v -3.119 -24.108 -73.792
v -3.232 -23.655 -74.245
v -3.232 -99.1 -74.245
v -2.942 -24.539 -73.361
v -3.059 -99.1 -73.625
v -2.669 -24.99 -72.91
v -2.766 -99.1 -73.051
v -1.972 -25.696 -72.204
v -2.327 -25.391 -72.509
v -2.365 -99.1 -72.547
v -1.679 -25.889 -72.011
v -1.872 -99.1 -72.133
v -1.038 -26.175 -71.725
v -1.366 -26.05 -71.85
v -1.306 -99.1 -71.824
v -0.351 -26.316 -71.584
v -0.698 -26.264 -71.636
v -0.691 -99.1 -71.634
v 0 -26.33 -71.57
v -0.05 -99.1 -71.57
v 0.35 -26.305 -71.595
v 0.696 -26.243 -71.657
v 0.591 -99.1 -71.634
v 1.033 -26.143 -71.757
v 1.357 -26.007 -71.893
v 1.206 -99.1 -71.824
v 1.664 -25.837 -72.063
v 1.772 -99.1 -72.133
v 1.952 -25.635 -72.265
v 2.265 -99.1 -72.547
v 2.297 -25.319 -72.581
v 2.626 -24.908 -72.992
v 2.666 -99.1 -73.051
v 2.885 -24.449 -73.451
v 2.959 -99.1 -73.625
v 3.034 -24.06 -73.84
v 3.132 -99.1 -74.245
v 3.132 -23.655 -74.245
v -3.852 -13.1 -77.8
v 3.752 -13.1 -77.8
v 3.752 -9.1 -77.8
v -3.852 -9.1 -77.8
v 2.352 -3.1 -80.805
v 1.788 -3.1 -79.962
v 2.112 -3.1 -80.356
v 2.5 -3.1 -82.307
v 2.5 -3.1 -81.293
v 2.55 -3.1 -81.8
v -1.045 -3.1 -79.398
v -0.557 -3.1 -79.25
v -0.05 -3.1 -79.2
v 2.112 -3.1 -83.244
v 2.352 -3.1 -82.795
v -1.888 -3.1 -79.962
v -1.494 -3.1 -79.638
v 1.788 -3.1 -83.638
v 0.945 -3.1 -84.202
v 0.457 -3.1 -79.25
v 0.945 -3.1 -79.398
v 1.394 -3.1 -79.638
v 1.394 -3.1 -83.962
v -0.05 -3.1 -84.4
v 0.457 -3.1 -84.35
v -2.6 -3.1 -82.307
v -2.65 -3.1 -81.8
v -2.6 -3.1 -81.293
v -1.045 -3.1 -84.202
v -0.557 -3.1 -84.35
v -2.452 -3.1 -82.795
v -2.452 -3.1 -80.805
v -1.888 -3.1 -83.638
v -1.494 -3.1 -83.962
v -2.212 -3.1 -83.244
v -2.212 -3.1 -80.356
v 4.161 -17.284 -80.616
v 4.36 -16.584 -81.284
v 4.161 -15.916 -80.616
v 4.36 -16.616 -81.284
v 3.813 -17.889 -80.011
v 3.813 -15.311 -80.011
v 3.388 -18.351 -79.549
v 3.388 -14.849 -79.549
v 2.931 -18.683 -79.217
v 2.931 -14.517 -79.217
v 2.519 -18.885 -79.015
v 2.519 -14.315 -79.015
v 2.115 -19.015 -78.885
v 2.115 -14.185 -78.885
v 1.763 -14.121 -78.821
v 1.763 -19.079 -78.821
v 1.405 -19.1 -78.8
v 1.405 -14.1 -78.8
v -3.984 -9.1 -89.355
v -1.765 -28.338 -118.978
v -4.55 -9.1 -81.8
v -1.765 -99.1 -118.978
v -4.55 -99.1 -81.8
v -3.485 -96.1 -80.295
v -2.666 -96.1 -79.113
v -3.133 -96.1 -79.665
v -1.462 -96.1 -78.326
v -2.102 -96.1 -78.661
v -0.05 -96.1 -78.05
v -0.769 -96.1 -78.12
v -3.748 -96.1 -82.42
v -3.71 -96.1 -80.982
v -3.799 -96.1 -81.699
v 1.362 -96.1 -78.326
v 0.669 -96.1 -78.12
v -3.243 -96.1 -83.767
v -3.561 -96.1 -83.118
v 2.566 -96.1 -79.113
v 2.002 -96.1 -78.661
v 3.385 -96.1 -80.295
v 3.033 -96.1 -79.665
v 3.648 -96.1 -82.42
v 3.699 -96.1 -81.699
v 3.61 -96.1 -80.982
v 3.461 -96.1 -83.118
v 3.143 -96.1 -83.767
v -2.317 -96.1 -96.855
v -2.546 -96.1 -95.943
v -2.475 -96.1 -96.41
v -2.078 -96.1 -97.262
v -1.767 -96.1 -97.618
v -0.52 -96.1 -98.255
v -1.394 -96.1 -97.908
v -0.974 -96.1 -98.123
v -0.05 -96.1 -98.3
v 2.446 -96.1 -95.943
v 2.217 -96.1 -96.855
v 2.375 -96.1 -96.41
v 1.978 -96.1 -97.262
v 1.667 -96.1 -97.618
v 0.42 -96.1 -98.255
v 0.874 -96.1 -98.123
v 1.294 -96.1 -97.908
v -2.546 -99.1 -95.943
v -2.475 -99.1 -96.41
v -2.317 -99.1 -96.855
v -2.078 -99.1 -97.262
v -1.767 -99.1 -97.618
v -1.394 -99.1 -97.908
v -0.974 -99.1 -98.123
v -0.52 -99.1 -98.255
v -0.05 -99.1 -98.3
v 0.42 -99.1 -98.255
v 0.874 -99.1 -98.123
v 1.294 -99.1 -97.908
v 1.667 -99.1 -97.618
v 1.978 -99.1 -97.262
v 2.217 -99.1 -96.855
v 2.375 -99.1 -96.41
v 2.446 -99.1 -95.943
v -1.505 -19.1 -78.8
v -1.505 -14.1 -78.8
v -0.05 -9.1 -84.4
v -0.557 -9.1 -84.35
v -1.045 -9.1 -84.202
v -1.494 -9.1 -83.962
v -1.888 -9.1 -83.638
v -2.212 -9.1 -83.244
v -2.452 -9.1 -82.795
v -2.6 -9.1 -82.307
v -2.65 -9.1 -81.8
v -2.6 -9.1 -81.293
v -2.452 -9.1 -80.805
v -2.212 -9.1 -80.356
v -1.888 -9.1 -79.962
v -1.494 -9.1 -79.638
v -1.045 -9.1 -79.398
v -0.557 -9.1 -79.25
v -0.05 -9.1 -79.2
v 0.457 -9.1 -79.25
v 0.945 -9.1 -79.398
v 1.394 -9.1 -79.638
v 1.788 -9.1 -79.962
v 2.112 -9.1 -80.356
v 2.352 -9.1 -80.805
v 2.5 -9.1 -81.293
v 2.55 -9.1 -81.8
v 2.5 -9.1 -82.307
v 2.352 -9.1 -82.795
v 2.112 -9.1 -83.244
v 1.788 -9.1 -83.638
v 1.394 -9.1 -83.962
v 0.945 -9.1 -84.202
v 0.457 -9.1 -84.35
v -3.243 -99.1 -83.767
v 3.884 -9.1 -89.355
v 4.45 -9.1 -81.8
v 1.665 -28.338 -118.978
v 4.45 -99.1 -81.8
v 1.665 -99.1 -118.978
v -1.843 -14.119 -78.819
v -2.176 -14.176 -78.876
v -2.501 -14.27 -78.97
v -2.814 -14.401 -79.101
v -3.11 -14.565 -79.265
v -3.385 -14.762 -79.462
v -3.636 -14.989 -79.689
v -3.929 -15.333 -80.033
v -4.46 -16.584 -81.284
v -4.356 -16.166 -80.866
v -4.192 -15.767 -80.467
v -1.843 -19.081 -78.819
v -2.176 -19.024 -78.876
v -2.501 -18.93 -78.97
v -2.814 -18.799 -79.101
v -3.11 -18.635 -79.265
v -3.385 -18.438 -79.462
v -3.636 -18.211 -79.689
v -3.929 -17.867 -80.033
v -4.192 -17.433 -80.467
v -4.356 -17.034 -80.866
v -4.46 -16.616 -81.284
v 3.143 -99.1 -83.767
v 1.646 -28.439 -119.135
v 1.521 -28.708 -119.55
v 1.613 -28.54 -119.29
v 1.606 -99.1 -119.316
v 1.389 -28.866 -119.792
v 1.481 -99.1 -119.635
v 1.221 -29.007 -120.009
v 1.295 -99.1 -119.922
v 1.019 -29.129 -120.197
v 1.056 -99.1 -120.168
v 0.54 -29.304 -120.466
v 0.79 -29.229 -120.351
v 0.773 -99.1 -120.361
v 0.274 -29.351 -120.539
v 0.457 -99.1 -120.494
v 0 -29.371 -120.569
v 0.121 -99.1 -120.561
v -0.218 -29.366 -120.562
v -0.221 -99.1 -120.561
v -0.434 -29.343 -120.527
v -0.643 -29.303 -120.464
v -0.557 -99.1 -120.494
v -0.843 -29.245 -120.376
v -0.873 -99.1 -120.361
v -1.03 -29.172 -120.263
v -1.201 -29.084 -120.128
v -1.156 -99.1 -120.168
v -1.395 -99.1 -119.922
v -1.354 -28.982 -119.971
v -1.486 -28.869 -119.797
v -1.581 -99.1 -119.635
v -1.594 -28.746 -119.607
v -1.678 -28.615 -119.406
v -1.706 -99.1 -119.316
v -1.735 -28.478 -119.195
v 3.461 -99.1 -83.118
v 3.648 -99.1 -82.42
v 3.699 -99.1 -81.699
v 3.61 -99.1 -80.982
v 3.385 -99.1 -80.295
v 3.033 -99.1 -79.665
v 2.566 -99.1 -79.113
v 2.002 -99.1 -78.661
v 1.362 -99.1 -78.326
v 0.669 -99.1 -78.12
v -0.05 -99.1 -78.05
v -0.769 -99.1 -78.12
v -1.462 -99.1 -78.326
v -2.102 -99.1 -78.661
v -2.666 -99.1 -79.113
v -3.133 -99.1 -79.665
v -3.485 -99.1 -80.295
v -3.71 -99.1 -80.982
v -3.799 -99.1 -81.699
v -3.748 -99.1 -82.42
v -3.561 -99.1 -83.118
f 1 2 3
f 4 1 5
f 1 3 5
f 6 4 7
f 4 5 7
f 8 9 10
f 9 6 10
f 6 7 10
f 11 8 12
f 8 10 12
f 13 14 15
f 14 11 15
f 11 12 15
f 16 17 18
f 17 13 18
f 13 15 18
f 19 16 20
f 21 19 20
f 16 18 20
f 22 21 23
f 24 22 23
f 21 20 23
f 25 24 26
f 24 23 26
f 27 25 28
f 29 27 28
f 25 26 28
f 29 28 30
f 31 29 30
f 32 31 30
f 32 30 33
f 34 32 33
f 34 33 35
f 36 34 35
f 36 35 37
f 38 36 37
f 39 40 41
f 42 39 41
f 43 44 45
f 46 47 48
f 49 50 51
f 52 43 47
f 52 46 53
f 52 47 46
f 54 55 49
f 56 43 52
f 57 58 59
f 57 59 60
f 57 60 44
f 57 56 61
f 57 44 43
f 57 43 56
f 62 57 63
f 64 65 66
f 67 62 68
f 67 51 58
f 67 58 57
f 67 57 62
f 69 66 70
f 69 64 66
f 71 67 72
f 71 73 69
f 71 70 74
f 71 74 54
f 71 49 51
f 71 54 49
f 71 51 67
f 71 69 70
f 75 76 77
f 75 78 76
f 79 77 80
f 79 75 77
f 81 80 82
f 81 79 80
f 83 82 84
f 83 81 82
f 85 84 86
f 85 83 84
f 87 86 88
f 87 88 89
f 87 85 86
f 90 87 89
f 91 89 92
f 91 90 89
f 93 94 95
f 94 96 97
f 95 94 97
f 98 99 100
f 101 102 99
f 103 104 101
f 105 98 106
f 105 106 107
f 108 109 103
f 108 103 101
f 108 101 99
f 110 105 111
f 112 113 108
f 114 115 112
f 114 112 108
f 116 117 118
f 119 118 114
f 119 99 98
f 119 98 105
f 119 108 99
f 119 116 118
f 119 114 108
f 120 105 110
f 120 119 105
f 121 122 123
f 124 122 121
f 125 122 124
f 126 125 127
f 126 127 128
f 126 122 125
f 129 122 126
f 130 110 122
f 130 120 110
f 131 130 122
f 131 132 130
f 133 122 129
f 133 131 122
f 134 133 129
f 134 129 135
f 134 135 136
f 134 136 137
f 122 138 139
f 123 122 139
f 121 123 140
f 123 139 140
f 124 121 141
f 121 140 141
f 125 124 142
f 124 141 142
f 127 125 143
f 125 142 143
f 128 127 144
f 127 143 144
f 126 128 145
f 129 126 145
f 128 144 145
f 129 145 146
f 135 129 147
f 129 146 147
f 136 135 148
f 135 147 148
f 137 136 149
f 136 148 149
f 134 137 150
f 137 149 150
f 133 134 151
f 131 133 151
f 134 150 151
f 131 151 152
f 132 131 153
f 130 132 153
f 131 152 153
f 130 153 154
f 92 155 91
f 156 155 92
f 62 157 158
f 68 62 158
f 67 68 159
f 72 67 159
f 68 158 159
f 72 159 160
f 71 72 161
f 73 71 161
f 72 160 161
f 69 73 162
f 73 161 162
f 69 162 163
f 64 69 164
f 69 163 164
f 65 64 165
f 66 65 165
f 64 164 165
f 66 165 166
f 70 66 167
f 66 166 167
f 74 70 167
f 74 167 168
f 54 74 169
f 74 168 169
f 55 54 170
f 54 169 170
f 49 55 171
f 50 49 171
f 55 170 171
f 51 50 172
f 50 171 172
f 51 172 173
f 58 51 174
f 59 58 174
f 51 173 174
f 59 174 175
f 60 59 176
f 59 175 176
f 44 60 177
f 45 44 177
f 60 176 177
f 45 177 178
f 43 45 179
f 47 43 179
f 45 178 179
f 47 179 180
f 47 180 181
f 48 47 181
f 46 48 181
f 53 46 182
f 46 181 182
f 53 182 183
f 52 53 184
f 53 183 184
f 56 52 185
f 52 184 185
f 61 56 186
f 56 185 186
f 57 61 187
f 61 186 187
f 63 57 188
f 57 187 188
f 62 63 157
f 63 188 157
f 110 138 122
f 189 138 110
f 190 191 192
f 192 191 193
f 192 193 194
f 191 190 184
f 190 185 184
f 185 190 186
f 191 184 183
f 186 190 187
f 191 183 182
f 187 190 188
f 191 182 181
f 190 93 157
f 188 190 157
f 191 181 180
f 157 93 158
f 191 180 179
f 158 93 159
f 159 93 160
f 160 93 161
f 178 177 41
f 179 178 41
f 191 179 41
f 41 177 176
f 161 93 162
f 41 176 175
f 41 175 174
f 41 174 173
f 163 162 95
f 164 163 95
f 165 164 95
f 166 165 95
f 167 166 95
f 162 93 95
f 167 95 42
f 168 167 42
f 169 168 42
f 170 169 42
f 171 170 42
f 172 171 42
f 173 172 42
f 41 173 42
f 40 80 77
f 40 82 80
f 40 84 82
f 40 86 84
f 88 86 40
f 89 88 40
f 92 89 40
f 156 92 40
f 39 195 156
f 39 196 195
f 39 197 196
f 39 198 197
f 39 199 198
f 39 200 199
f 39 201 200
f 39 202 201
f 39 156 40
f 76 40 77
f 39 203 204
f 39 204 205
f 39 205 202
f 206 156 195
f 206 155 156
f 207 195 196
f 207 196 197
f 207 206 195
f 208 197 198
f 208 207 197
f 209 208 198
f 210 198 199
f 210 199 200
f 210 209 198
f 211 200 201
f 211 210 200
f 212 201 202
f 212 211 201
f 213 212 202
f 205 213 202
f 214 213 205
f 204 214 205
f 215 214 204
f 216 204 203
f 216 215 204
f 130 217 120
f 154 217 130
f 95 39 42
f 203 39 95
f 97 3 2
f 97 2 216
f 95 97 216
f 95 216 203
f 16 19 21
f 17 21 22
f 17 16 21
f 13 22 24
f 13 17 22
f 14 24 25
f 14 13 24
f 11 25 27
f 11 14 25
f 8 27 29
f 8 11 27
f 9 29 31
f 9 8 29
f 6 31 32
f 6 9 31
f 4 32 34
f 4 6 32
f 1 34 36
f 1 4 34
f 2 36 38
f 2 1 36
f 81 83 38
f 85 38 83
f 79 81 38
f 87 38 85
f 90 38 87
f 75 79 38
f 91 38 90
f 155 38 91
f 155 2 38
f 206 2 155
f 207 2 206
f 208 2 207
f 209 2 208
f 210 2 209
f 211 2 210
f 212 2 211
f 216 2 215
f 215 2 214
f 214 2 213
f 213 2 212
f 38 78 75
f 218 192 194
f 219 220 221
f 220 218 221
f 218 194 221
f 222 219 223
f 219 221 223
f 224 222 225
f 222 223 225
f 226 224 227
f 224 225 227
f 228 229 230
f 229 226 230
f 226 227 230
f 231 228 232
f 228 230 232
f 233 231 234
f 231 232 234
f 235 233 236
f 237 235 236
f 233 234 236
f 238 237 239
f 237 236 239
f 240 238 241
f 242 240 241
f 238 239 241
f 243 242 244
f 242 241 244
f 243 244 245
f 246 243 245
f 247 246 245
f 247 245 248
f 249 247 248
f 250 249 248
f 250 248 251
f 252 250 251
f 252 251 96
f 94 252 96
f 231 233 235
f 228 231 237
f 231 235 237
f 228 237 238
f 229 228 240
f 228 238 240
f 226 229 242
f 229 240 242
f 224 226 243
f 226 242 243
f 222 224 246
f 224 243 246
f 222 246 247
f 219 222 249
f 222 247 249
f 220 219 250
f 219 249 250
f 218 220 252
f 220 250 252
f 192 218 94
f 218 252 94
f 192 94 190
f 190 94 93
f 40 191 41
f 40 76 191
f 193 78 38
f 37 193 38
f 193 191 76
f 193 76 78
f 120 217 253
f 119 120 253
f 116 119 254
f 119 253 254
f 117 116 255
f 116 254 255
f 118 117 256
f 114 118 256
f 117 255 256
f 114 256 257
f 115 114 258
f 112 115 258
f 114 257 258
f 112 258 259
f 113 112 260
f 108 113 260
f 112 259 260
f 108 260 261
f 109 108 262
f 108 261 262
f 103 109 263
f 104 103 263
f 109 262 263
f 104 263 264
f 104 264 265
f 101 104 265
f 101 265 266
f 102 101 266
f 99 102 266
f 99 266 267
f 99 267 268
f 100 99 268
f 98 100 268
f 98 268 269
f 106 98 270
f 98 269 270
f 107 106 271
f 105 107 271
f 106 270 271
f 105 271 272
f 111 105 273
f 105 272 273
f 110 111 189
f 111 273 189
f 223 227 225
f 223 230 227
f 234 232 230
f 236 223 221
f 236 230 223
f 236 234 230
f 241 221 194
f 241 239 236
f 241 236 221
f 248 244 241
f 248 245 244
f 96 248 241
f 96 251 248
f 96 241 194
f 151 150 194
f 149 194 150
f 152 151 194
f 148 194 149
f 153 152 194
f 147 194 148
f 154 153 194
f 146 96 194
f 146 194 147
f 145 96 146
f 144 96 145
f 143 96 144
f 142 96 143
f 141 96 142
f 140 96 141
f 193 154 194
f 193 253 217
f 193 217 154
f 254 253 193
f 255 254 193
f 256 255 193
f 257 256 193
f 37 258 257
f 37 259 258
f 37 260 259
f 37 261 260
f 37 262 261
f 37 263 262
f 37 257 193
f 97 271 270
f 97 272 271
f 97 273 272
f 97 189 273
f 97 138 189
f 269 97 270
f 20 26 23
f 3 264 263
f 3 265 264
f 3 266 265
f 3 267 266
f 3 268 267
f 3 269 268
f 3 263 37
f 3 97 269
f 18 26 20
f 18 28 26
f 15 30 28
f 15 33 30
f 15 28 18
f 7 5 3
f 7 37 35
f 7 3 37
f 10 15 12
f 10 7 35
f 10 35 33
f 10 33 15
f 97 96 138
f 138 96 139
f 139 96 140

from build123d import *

# Parameters (mm, degrees)
PAD004_DEPTH      = 90
POCKET_DEPTH      = 4.551
POCKET_DEPTH_BACK = 4.451
SKETCH028_R       = 2.6
PAD011_DEPTH      = 6
POCKET014_DEPTH   = 3
FILLET011_R       = 3


with BuildPart() as part:
    # Sketch008 (on Face1 of CopyFusion010) → Pad004 (new body)
    with BuildSketch(Plane(origin=(-0.05, -99.1, -81.8), x_dir=(0, 0, -1), z_dir=(0, 1, 0))):
        with BuildLine():
            Line((0, -4.5), (-7.555119, -3.18194))
            ThreePointArc((-7.555119, 3.18194), (-10.23, 0), (-7.555119, -3.18194))
            Line((-7.555119, 3.18194), (0, 4.5))
            Line((37.178474, 1.715195), (0, 4.5))
            ThreePointArc((37.178474, -1.715195), (38.77, 0), (37.178474, 1.715195))
            Line((0, -4.5), (37.178474, -1.715195))
        make_face()
    extrude(amount=PAD004_DEPTH)

    # Sketch027 → Pocket (cut, two sides)
    with BuildSketch(Plane.YZ) as pocket_sk:
        Polygon((-9.1, -139.355119), (-41.57038, -139.355119), (-9.1, -89.355119), align=None)
        Polygon((-9.1, -27.8), (-70.1, -27.8), (-19.1, -78.8), (-14.1, -78.8), (-13.1, -77.8), (-9.1, -77.8), align=None)
    extrude(amount=-POCKET_DEPTH, mode=Mode.SUBTRACT)
    extrude(pocket_sk.sketch, amount=POCKET_DEPTH_BACK, mode=Mode.SUBTRACT)

    # Sketch028 (on Face8 of Pocket) → Pad011 (join)
    with BuildSketch(Plane(origin=(-0.05, -9.1, -81.8), x_dir=(0, 0, -1), z_dir=(0, 1, 0))):
        Circle(SKETCH028_R)
    extrude(amount=PAD011_DEPTH)

    # Sketch038 (on Face2 of Pad011) → Pocket014 (cut)
    with BuildSketch(Plane(origin=(-0.05, -99.1, -81.8), x_dir=(0, 0, -1), z_dir=(0, -1, 0))):
        with BuildLine():
            ThreePointArc((1.966812, 3.192828), (-3.75, 0), (1.966812, -3.192828))
            Line((14.142845, -2.495916), (1.966812, -3.192828))
            ThreePointArc((14.142845, -2.495916), (16.5, 0), (14.142845, 2.495916))
            Line((1.966812, 3.192828), (14.142845, 2.495916))
        make_face()
    extrude(amount=-POCKET014_DEPTH, mode=Mode.SUBTRACT)

    # Fillet011
    fillet011_edges = [part.edges().sort_by_distance(p)[0] for p in [
        (3.926622, -16.6, -78.8),
        (-4.026622, -16.6, -78.8),
    ]]
    fillet(fillet011_edges, radius=FILLET011_R)


solid = part.part
